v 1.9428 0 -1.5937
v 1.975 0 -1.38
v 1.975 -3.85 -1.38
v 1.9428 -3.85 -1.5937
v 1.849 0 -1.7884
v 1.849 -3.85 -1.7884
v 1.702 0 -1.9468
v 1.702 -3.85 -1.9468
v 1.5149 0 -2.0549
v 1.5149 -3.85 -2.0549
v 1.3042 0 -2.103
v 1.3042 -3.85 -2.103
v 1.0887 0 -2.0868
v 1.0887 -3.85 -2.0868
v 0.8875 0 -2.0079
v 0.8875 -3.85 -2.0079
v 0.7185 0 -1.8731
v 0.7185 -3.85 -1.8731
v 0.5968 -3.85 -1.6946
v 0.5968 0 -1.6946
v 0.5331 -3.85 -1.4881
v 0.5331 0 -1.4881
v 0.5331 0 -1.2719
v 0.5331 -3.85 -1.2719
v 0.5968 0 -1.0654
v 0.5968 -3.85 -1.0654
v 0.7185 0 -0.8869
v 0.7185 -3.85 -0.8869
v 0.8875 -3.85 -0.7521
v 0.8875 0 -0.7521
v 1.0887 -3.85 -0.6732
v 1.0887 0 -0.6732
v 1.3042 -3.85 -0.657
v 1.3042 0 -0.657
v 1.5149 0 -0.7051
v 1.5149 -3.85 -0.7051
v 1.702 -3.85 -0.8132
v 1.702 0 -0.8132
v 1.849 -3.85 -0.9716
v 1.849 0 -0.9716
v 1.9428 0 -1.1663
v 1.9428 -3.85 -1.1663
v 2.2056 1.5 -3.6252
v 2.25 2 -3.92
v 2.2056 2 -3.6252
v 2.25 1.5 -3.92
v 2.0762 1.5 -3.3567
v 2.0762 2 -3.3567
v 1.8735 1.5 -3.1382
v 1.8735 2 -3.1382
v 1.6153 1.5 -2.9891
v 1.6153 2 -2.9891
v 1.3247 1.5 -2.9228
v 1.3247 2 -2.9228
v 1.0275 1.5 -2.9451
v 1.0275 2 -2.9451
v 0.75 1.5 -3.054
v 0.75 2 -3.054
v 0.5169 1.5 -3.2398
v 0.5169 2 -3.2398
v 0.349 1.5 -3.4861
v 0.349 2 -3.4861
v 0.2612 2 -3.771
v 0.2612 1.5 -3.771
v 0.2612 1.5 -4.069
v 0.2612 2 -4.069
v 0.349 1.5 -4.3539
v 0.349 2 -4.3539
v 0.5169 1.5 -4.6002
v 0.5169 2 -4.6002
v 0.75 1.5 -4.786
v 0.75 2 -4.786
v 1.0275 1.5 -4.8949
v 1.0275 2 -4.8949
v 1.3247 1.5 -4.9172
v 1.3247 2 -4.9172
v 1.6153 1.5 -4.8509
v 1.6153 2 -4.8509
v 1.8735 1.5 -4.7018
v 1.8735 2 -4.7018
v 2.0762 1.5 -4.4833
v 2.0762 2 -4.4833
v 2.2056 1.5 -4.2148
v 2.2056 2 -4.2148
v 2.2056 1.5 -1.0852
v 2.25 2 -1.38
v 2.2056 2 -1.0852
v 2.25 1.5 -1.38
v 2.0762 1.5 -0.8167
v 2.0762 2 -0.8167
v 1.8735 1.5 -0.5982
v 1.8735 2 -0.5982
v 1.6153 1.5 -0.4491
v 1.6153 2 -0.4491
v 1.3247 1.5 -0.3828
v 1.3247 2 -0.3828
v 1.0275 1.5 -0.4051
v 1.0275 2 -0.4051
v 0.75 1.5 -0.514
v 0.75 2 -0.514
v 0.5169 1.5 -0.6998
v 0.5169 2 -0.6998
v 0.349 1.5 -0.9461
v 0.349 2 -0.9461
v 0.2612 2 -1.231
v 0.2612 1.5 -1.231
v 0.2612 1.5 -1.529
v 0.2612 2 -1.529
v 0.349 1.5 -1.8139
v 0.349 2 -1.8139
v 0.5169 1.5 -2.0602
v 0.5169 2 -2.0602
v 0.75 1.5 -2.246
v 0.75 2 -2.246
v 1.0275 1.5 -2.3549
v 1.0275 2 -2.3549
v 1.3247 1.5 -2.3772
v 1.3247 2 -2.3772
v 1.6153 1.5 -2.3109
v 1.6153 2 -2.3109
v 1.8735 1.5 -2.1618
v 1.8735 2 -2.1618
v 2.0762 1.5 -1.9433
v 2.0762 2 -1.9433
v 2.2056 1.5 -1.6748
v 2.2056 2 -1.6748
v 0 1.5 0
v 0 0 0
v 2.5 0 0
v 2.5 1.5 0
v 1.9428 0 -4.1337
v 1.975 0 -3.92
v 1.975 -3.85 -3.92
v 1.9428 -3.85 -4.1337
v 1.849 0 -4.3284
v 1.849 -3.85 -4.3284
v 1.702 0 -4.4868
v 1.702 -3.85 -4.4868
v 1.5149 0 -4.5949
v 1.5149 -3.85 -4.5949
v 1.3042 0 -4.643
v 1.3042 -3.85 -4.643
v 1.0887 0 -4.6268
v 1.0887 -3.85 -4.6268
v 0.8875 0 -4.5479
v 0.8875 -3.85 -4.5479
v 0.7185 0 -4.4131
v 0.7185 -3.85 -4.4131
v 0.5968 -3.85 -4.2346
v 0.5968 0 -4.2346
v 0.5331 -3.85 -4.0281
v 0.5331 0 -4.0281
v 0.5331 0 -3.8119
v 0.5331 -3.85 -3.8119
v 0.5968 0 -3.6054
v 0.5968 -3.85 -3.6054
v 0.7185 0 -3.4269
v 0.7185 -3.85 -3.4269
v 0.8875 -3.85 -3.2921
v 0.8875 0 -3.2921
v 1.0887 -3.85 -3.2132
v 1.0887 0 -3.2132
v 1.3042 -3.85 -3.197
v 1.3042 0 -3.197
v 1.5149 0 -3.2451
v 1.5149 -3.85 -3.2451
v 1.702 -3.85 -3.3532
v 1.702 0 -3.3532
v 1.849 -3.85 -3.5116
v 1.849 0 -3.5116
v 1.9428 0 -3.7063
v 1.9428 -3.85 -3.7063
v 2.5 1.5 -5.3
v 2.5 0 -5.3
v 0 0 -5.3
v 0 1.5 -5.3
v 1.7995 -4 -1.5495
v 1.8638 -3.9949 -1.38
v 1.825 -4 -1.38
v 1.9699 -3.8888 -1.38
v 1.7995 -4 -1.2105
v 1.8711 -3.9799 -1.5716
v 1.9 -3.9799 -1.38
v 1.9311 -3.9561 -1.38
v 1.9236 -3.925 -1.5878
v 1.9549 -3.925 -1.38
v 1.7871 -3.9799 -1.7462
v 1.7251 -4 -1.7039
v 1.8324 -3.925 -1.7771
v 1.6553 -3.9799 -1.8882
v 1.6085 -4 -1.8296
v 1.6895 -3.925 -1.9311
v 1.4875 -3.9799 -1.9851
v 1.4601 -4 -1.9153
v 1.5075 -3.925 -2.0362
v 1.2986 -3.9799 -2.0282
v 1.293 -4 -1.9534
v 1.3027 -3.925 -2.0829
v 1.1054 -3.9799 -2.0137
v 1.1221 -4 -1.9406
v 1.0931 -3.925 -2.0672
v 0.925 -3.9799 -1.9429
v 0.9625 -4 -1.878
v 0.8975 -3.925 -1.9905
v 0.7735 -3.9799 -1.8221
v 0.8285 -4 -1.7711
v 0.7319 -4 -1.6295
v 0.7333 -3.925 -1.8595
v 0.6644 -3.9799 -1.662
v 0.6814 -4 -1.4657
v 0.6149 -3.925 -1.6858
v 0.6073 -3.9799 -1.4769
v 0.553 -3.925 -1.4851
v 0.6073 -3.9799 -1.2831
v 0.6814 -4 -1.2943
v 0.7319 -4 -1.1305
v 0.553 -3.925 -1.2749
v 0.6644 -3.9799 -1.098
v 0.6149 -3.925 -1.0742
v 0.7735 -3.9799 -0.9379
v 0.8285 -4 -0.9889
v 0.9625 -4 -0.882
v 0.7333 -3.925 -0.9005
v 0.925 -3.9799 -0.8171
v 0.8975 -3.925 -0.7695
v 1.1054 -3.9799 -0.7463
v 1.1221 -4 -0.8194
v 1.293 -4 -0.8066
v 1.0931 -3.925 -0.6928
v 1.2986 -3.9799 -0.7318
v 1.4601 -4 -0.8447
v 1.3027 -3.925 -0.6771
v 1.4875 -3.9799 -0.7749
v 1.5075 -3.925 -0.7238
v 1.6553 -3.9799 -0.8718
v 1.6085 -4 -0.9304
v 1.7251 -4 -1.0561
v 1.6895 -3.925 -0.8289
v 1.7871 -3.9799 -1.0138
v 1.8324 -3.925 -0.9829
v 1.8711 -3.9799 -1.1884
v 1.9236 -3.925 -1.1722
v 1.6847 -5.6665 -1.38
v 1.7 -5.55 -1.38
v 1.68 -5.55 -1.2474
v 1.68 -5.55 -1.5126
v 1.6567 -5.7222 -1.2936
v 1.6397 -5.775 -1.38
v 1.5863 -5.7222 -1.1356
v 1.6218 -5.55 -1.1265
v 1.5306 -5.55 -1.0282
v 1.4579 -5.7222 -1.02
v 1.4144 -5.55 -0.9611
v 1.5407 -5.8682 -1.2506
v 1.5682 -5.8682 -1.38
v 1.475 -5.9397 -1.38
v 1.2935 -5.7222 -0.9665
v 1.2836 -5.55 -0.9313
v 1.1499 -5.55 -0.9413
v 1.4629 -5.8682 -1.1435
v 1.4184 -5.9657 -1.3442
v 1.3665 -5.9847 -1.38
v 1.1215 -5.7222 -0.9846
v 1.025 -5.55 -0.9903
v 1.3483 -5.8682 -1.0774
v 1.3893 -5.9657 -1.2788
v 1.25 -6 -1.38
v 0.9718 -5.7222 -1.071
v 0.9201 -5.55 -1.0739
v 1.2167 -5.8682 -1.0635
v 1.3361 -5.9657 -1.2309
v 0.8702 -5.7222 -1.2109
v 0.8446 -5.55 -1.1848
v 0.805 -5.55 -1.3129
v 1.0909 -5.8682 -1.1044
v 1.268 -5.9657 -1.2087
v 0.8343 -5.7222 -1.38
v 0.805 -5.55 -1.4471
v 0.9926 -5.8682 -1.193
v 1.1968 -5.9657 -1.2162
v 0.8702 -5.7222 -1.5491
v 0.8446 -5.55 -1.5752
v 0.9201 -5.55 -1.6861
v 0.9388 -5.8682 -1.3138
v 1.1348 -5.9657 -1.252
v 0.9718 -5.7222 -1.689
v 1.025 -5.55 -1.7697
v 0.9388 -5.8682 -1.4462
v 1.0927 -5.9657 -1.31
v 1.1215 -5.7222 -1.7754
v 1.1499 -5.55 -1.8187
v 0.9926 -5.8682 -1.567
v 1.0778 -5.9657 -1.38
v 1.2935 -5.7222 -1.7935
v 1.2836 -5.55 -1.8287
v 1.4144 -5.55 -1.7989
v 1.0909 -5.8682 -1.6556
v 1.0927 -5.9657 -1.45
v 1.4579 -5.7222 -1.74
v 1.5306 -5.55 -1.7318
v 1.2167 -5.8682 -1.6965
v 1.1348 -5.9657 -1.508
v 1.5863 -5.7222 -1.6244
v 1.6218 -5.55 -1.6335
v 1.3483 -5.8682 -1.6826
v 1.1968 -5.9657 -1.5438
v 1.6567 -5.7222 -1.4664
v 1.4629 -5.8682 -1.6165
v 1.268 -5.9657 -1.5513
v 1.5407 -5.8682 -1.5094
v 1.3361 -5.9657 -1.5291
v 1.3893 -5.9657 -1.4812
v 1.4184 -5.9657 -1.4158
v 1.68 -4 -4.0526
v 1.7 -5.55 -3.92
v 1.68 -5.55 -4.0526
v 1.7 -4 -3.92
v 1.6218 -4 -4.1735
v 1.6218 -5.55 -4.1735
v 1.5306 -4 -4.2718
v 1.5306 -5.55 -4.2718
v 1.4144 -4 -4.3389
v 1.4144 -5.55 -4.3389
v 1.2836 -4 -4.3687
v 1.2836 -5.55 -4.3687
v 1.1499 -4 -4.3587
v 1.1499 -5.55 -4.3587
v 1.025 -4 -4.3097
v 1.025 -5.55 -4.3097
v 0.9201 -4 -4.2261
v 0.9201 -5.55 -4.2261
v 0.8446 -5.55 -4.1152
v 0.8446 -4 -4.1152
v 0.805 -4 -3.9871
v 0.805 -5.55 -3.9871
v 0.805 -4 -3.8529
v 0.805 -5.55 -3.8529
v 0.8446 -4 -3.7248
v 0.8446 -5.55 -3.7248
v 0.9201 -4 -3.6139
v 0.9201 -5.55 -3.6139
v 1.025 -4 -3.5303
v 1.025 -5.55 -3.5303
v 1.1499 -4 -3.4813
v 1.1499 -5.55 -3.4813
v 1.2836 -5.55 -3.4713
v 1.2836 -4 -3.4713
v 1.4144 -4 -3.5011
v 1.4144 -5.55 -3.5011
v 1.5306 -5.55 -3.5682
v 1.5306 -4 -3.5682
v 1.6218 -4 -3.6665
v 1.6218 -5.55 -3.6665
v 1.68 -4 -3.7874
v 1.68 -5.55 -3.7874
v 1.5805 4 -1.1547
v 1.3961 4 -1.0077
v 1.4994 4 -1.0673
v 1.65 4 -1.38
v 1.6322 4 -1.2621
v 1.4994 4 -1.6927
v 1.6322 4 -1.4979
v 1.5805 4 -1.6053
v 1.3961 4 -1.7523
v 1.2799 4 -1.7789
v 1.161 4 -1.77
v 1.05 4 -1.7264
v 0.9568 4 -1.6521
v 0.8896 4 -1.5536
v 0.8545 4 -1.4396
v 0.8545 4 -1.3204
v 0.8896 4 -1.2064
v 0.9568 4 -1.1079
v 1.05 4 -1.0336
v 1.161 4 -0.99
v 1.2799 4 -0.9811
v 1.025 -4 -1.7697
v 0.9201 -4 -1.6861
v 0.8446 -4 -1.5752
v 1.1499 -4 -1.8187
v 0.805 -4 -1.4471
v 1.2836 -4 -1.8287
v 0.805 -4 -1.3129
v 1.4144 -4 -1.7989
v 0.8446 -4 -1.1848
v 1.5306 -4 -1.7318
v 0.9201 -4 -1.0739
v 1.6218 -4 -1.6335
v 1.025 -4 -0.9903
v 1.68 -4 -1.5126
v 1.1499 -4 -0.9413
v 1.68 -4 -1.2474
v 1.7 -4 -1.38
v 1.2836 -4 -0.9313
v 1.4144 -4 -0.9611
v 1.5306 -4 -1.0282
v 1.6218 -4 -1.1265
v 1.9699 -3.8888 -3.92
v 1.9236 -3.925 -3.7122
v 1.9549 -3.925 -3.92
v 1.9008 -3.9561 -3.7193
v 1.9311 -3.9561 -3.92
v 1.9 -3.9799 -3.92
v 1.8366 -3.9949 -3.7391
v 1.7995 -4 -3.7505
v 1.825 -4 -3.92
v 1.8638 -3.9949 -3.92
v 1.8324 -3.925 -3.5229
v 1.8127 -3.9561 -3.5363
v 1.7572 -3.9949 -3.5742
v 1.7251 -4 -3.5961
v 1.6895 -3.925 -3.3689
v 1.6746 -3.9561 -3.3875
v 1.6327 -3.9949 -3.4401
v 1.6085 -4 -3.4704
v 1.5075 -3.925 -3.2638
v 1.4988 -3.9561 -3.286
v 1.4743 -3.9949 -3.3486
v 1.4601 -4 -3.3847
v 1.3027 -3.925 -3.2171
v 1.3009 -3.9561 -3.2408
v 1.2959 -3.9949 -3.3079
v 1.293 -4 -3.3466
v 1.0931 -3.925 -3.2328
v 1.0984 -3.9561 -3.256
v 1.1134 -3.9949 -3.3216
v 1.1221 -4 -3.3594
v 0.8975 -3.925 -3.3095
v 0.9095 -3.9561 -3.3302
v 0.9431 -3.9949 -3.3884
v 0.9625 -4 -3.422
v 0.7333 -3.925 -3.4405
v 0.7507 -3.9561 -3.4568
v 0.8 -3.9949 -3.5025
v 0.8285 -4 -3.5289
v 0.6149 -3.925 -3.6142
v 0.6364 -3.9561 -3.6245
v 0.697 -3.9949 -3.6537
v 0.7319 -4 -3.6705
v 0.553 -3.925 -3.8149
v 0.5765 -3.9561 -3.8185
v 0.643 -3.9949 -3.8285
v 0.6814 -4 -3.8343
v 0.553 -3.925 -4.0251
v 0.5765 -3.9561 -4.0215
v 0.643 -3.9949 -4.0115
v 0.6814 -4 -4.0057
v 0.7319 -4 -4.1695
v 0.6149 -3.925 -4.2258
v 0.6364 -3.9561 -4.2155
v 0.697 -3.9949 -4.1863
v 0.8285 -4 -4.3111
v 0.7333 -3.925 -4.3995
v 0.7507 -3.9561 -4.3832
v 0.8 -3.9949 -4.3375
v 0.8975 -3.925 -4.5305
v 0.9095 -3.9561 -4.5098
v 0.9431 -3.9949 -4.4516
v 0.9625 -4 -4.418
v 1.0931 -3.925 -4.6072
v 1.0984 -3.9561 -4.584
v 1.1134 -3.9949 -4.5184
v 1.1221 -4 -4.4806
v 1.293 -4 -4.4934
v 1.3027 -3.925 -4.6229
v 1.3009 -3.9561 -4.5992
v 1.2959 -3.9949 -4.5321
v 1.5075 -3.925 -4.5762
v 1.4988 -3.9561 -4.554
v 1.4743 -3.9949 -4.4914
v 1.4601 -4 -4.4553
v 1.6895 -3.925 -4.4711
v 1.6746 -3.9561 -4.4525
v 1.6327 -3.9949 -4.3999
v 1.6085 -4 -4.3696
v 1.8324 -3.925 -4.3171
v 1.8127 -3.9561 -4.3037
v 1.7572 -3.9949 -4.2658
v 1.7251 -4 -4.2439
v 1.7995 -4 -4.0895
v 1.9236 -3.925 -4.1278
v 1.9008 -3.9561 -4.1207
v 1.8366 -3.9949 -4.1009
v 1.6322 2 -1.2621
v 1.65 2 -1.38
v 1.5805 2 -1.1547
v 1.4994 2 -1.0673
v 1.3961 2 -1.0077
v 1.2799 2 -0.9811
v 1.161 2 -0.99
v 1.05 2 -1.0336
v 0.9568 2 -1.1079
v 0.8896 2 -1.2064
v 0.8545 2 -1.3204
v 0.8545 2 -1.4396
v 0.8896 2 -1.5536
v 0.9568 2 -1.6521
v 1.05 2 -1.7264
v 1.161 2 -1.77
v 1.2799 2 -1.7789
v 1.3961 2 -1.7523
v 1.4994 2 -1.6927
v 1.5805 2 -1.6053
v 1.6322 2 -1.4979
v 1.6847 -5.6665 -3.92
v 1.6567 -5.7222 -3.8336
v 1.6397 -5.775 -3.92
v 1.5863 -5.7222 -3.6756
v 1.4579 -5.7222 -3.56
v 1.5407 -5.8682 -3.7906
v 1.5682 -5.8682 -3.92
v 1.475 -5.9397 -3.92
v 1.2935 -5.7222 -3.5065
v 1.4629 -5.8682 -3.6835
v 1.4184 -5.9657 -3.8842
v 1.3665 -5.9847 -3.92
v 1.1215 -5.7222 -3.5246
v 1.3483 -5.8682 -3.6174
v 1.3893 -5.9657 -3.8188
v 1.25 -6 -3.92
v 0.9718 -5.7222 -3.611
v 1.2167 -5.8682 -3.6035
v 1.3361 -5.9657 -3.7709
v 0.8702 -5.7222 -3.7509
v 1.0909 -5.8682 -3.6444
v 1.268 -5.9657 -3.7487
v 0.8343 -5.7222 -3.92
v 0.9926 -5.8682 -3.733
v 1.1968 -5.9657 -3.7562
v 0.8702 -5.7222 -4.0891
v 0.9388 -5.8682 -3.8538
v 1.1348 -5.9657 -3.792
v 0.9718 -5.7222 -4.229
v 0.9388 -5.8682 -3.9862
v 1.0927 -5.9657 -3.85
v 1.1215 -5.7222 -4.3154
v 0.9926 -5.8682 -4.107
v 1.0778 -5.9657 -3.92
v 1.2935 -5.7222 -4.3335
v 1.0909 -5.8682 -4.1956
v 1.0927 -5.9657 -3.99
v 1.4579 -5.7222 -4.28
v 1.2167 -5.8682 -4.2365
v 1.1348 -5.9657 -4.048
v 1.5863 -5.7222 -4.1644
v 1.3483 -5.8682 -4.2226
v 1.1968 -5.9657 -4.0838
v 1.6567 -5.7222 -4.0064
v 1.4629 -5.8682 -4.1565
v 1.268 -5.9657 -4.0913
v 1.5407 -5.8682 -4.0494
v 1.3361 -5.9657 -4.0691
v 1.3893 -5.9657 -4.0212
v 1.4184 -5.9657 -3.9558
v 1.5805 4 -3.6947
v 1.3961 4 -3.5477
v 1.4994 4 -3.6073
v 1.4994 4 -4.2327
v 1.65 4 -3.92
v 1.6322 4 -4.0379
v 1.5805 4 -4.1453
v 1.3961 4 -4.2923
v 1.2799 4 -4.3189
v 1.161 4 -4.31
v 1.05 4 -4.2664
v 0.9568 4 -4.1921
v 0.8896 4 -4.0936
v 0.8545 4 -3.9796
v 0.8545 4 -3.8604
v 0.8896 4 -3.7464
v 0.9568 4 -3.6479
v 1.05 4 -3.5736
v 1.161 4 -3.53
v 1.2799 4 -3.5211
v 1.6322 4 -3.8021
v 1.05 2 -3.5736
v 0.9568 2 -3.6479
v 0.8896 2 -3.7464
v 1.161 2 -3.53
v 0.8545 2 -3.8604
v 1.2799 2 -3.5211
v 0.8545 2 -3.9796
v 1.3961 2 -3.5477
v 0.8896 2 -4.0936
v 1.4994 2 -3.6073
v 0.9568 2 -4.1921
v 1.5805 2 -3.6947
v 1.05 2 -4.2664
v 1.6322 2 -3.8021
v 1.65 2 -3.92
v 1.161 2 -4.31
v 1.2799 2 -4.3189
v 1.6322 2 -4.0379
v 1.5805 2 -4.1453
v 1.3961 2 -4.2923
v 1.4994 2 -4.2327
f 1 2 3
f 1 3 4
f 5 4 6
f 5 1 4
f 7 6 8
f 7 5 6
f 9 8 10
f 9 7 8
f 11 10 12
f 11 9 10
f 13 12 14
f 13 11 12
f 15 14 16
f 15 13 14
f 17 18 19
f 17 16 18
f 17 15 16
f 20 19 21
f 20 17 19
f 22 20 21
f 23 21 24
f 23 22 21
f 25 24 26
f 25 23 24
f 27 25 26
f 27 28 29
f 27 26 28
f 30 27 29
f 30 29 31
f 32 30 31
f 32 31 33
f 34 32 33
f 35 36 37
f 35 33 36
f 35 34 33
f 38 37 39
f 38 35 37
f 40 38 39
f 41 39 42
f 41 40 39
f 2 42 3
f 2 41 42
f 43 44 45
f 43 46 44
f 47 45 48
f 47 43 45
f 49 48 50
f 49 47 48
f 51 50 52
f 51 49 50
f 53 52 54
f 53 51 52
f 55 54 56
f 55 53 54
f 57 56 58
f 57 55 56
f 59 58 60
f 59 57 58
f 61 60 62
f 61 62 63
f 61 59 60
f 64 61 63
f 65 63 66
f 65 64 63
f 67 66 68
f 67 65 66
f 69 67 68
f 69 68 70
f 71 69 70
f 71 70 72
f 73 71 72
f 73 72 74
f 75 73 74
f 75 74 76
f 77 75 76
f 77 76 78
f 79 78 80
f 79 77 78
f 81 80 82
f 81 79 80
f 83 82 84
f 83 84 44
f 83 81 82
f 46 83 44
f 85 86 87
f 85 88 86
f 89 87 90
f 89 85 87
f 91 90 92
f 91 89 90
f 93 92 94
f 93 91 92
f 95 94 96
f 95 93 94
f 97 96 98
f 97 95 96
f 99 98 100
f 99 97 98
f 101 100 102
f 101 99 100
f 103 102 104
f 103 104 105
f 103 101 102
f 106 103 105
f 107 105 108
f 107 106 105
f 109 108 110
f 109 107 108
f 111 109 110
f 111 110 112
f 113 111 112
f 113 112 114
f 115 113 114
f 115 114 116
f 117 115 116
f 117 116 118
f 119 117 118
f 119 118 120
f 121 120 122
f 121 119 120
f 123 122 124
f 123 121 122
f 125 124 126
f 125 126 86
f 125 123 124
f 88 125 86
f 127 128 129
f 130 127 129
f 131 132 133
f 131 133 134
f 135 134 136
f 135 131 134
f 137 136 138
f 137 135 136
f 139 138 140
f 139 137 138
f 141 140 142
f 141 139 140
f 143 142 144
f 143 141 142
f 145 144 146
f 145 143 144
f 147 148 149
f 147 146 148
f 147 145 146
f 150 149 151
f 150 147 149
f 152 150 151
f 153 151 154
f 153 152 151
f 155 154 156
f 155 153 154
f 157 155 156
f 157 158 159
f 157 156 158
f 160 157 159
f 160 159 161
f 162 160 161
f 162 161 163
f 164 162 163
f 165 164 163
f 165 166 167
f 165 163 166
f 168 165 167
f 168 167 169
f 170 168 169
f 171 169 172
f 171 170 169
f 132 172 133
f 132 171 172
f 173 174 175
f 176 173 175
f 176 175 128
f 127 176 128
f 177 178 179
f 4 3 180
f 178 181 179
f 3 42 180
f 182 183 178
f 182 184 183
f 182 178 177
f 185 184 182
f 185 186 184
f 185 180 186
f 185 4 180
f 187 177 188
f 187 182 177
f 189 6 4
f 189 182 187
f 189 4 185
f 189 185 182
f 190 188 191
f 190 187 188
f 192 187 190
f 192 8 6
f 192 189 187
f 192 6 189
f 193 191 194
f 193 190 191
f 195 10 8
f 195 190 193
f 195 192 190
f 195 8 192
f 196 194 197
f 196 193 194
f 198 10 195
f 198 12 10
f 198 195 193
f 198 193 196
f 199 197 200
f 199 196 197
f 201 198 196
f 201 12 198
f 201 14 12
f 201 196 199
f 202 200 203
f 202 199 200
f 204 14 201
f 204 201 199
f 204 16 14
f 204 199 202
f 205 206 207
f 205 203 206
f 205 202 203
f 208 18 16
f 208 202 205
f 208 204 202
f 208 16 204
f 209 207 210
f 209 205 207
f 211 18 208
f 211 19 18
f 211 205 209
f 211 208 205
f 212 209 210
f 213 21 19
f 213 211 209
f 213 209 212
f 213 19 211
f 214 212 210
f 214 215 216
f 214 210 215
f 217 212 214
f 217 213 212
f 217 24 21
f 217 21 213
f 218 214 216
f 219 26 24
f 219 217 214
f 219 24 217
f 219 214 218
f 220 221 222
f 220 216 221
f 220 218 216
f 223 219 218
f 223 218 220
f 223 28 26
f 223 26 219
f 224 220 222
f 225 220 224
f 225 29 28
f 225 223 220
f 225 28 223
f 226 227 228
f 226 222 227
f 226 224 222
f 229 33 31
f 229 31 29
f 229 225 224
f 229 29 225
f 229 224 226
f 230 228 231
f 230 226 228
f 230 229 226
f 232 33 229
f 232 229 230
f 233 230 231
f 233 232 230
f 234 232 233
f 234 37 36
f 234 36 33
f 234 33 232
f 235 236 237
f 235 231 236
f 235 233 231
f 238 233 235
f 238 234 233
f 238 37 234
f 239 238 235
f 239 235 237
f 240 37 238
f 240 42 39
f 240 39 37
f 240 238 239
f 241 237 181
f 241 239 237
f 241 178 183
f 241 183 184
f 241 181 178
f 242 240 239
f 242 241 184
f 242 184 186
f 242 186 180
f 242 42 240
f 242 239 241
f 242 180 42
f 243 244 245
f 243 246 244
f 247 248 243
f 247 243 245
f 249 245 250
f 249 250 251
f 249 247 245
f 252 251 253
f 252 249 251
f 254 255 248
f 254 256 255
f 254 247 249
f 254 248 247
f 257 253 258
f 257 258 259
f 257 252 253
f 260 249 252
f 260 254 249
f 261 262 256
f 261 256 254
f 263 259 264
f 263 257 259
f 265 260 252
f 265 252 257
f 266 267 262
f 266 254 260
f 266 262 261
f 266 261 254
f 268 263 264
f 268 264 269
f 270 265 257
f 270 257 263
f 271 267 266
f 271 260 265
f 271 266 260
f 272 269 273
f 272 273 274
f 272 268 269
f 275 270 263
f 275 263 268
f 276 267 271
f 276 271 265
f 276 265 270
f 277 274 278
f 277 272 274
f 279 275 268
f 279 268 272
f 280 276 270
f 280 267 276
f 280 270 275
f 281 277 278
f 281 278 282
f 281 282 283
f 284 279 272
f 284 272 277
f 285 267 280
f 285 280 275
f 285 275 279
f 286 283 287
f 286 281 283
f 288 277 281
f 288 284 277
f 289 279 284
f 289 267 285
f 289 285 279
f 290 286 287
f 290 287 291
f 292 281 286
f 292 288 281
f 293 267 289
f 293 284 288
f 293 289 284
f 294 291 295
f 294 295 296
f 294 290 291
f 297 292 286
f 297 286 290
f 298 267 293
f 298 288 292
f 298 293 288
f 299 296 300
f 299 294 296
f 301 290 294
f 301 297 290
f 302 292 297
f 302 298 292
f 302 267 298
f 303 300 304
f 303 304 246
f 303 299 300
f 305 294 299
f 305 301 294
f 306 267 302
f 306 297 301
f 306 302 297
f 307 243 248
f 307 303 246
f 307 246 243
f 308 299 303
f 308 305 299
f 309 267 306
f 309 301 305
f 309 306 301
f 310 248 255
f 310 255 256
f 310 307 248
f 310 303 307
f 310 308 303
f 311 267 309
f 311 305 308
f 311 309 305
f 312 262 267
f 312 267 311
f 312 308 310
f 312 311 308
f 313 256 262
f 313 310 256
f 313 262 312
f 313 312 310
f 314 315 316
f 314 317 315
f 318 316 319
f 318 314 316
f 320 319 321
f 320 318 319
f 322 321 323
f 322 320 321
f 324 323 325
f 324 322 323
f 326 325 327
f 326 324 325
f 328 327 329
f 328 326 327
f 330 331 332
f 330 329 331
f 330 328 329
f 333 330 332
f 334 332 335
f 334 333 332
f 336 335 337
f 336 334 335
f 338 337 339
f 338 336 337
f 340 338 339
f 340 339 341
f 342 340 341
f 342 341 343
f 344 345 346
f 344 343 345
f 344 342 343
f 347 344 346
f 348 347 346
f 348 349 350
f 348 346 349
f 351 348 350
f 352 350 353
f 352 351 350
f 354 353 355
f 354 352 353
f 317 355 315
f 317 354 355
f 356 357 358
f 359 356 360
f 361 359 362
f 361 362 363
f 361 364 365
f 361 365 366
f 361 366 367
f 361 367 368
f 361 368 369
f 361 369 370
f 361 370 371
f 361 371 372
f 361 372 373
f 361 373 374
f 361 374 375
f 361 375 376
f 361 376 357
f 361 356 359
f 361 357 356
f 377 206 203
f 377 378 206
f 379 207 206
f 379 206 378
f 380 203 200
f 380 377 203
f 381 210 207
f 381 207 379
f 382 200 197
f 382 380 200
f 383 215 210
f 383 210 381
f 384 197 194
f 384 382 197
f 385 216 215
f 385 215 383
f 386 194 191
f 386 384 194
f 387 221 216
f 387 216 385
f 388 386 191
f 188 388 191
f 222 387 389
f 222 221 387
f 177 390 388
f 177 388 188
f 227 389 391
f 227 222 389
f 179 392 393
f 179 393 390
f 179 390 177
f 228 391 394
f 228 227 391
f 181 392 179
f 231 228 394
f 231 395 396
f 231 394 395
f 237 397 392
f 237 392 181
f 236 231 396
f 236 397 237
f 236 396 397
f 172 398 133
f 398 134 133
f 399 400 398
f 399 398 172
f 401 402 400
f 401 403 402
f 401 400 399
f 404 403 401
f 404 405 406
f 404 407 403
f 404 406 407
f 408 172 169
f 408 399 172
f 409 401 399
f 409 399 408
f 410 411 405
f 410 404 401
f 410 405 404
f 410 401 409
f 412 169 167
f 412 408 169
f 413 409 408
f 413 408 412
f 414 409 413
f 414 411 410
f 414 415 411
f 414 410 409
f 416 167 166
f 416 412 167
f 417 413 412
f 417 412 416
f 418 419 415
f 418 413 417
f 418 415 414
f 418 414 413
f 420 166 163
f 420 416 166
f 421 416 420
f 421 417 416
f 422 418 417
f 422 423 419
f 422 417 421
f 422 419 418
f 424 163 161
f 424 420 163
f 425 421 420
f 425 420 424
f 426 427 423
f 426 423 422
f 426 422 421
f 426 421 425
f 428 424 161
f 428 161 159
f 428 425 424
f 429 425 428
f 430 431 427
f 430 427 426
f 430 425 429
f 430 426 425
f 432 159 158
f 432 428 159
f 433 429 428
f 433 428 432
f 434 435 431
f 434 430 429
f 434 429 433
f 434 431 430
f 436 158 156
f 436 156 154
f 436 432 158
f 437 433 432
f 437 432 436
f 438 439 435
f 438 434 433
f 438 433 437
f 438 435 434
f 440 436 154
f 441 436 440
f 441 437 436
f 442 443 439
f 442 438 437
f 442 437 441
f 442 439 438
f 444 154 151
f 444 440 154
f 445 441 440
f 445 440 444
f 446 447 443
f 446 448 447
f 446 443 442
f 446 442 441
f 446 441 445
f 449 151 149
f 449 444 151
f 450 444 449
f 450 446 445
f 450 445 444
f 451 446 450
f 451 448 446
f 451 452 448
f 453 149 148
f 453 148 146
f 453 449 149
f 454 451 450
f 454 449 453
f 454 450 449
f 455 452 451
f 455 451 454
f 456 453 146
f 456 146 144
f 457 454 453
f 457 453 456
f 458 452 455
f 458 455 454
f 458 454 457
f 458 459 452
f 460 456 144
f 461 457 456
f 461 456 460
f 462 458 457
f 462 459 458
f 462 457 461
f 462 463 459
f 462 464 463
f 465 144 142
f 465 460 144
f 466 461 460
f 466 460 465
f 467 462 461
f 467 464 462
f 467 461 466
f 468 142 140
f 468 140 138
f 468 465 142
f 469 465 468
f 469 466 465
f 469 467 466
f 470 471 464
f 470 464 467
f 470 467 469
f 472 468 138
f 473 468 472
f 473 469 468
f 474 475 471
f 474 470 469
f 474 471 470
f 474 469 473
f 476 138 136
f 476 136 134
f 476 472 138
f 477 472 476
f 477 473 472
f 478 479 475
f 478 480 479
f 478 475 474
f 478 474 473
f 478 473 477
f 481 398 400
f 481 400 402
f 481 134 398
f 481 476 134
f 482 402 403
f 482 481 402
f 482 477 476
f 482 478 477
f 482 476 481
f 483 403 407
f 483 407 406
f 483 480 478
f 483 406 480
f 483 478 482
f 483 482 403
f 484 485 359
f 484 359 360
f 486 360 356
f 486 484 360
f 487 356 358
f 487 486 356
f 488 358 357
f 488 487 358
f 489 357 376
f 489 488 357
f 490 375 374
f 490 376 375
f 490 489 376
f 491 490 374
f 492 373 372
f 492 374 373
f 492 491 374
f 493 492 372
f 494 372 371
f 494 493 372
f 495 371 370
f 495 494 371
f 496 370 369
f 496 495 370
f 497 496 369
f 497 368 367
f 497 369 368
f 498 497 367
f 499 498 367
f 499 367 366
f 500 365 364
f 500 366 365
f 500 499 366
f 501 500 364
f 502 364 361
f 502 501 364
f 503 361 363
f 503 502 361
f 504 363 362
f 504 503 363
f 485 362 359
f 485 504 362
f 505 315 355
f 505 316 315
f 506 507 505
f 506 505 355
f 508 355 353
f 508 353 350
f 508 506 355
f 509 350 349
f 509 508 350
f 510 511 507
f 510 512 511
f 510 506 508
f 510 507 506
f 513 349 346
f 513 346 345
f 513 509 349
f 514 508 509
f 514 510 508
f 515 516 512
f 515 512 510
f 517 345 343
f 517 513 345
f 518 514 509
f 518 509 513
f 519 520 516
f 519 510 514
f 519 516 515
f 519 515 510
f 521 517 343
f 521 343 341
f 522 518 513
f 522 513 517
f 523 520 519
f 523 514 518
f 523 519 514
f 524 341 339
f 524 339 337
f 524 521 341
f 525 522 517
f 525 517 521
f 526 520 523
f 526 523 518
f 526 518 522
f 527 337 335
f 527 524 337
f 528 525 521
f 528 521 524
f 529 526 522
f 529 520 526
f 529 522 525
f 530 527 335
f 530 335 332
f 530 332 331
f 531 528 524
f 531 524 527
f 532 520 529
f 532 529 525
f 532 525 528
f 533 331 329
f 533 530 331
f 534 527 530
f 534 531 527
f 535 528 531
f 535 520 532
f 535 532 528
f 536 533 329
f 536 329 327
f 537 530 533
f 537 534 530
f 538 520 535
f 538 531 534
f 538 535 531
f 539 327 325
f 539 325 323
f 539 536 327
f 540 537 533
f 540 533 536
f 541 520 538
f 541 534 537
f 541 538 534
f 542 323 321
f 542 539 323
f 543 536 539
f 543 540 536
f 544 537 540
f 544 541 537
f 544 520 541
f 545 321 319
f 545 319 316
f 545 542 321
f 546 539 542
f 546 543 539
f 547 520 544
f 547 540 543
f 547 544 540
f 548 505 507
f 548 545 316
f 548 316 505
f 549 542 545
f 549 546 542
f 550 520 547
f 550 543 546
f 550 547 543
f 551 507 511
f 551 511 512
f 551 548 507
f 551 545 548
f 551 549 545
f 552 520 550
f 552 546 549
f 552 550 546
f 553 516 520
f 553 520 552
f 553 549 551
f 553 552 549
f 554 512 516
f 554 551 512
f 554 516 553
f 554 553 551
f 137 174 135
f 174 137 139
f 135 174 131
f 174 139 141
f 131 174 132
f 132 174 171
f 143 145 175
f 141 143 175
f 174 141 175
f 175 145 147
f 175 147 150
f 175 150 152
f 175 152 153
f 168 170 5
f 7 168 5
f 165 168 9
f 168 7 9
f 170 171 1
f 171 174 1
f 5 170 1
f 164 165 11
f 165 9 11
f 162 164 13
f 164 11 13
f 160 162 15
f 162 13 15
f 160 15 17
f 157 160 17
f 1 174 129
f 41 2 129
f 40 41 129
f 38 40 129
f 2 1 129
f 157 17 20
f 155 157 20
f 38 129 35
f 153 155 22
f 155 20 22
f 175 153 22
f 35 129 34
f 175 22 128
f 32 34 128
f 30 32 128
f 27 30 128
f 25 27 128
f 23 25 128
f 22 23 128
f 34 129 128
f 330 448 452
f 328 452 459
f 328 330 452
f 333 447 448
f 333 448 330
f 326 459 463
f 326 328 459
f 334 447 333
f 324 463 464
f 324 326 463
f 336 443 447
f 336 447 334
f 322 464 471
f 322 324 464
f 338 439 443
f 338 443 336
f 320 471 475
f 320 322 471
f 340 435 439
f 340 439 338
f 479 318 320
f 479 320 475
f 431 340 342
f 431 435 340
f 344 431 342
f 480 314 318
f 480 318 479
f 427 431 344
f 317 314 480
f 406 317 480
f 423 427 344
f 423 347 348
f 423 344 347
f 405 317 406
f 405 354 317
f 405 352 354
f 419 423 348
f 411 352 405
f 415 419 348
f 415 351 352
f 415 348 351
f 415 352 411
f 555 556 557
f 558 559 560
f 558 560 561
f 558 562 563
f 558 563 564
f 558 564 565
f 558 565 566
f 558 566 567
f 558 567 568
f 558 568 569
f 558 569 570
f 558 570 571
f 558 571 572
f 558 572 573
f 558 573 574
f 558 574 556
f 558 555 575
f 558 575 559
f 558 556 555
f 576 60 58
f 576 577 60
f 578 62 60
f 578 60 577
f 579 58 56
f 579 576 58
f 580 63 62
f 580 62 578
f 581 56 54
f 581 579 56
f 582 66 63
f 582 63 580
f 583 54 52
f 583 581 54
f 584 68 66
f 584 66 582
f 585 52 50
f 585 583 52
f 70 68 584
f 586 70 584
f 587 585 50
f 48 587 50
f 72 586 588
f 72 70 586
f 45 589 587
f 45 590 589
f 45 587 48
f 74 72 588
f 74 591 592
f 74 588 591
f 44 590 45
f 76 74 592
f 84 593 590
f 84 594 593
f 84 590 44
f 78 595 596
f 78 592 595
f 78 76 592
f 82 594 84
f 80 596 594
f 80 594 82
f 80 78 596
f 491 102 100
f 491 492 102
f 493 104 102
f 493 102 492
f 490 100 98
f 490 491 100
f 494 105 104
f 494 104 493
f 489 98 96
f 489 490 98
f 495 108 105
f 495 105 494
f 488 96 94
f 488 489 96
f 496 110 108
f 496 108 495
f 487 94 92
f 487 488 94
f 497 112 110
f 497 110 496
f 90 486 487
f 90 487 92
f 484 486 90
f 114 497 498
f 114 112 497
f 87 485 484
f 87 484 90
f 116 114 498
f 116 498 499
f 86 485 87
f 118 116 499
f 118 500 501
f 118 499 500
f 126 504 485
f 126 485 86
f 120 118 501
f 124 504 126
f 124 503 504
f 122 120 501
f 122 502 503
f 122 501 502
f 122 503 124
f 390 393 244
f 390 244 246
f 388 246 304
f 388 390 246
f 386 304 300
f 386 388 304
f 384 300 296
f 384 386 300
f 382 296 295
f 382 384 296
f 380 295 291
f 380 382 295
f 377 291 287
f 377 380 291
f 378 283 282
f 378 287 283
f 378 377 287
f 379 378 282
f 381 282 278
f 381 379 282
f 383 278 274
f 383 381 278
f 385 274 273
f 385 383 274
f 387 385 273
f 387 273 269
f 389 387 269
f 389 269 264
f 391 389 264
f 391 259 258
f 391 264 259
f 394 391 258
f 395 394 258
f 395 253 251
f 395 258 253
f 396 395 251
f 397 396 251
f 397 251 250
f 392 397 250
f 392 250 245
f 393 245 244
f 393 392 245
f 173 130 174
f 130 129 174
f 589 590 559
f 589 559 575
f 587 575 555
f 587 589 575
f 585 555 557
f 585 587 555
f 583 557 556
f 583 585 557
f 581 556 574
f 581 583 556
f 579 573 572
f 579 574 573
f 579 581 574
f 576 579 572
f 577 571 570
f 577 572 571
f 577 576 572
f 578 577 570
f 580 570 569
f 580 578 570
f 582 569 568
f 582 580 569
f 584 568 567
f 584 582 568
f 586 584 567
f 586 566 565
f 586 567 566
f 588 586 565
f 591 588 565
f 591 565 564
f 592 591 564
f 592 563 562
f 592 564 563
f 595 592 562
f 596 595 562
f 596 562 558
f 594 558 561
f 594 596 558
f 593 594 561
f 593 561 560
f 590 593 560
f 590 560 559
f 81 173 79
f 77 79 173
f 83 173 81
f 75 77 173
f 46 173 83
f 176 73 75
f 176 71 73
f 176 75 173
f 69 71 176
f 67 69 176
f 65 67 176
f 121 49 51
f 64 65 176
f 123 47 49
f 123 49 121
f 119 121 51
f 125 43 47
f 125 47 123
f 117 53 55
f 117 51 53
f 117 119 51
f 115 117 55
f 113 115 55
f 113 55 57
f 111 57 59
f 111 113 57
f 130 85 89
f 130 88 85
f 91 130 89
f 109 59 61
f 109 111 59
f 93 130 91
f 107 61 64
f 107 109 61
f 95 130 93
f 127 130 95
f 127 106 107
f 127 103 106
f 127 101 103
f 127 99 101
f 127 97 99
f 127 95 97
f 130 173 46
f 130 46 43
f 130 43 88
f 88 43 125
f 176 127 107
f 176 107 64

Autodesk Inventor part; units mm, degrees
ref_plane "YZ Plane" through (0, 0, 0) normal (1, 0, 0) x (0, 1, 0)
ref_plane "XZ Plane" through (0, 0, 0) normal (0, 1, 0) x (-1, 0, 0)
ref_plane "XY Plane" through (0, 0, 0) normal (0, 0, 1) x (1, 0, 0)
sketch "草图1" plane through (0, 0, 0) normal (0, 1, 0) x (-1, 0, 0)
  point P0 (0, 0)
sketch "草图2" plane through (0, 0, 0) normal (0, 1, 0) x (-1, 0, 0)
  line L0 (0, 0) -> (-2.5, 0)
  line L1 (-2.5, 0) -> (-2.5, -5.3)
  line L2 (-2.5, -5.3) -> (0, -5.3)
  line L3 (0, -5.3) -> (0, 0)
  dimension "d0" = 2.5
  dimension "d1" = 5.3
extrude "拉伸1" add sketch "草图2" along normal blind 1.5
sketch "草图3" plane through (0, 1.5, 0) normal (0, 1, 0) x (1, 0, 0)
  line L0 (2.5, 5.3) -> (0, 5.3) projected
  line L1 (1.25, 5.3) -> (1.25, 0)
  line L2 (0, 5.3) -> (0, 0) projected
  line L3 (1.25, 2.65) -> (1.25, 3.92)
  line L4 (1.25, 3.92) -> (1.25, 1.38)
  circle A0 centre (1.25, 3.92) radius 1
  circle A1 centre (1.25, 1.38) radius 1
  dimension "d4" = 1.27
  dimension "d5" = 2.54
  dimension "d6" = 2
  dimension "d7" = 2
extrude "拉伸2" add sketch "草图3" along normal blind 0.5
sketch "草图4" plane through (1.25, 2, -1.38) normal (0, 1, 0) x (1, 0, 0)
  circle A0 centre (0, 0) radius 0.4
  circle A1 centre (0, 2.54) radius 1 projected
  circle A2 centre (0, 2.54) radius 0.4
  point P0 (-1.25, -1.38)
  dimension "d10" = 0.8
  dimension "d11" = 0.8
extrude "拉伸3" add sketch "草图4" along normal blind 2 contours A0 | A2
sketch "草图5" plane through (0, 0, 0) normal (0, -1, 0) x (1, 0, 0)
  circle A0 centre (1.25, -3.92) radius 0.4 projected
  circle A1 centre (1.25, -3.92) radius 0.725
  circle A2 centre (1.25, -1.38) radius 0.4 projected
  circle A3 centre (1.25, -1.38) radius 0.725
  point P0 (0, 0)
  dimension "d14" = 1.45
  dimension "d15" = 1.45
extrude "拉伸4" add sketch "草图5" along normal blind 4 contours A0 | A1 | A2 | A3
sketch "草图6" plane through (1.25, -4, -1.38) normal (0, -1, 0) x (1, 0, 0)
  circle A0 centre (0, 0) radius 0.45
  circle A1 centre (0, -2.54) radius 0.725 projected
  circle A2 centre (0, -2.54) radius 0.45
  point P0 (-1.25, 1.38)
  dimension "d18" = 0.9
  dimension "d19" = 0.9
extrude "拉伸5" add sketch "草图6" along normal blind 2 contours A0 | A2
fillet "圆角1" radius 0.45 1 edges at (0.8, -6, -3.92)
fillet "圆角2" radius 0.45 1 edges at (0.8, -6, -1.38)
fillet "圆角3" radius 0.15 2 edges at (0.525, -4, -3.92) (0.525, -4, -1.38)
properties part number "Pogo_Pin" material "铜"
